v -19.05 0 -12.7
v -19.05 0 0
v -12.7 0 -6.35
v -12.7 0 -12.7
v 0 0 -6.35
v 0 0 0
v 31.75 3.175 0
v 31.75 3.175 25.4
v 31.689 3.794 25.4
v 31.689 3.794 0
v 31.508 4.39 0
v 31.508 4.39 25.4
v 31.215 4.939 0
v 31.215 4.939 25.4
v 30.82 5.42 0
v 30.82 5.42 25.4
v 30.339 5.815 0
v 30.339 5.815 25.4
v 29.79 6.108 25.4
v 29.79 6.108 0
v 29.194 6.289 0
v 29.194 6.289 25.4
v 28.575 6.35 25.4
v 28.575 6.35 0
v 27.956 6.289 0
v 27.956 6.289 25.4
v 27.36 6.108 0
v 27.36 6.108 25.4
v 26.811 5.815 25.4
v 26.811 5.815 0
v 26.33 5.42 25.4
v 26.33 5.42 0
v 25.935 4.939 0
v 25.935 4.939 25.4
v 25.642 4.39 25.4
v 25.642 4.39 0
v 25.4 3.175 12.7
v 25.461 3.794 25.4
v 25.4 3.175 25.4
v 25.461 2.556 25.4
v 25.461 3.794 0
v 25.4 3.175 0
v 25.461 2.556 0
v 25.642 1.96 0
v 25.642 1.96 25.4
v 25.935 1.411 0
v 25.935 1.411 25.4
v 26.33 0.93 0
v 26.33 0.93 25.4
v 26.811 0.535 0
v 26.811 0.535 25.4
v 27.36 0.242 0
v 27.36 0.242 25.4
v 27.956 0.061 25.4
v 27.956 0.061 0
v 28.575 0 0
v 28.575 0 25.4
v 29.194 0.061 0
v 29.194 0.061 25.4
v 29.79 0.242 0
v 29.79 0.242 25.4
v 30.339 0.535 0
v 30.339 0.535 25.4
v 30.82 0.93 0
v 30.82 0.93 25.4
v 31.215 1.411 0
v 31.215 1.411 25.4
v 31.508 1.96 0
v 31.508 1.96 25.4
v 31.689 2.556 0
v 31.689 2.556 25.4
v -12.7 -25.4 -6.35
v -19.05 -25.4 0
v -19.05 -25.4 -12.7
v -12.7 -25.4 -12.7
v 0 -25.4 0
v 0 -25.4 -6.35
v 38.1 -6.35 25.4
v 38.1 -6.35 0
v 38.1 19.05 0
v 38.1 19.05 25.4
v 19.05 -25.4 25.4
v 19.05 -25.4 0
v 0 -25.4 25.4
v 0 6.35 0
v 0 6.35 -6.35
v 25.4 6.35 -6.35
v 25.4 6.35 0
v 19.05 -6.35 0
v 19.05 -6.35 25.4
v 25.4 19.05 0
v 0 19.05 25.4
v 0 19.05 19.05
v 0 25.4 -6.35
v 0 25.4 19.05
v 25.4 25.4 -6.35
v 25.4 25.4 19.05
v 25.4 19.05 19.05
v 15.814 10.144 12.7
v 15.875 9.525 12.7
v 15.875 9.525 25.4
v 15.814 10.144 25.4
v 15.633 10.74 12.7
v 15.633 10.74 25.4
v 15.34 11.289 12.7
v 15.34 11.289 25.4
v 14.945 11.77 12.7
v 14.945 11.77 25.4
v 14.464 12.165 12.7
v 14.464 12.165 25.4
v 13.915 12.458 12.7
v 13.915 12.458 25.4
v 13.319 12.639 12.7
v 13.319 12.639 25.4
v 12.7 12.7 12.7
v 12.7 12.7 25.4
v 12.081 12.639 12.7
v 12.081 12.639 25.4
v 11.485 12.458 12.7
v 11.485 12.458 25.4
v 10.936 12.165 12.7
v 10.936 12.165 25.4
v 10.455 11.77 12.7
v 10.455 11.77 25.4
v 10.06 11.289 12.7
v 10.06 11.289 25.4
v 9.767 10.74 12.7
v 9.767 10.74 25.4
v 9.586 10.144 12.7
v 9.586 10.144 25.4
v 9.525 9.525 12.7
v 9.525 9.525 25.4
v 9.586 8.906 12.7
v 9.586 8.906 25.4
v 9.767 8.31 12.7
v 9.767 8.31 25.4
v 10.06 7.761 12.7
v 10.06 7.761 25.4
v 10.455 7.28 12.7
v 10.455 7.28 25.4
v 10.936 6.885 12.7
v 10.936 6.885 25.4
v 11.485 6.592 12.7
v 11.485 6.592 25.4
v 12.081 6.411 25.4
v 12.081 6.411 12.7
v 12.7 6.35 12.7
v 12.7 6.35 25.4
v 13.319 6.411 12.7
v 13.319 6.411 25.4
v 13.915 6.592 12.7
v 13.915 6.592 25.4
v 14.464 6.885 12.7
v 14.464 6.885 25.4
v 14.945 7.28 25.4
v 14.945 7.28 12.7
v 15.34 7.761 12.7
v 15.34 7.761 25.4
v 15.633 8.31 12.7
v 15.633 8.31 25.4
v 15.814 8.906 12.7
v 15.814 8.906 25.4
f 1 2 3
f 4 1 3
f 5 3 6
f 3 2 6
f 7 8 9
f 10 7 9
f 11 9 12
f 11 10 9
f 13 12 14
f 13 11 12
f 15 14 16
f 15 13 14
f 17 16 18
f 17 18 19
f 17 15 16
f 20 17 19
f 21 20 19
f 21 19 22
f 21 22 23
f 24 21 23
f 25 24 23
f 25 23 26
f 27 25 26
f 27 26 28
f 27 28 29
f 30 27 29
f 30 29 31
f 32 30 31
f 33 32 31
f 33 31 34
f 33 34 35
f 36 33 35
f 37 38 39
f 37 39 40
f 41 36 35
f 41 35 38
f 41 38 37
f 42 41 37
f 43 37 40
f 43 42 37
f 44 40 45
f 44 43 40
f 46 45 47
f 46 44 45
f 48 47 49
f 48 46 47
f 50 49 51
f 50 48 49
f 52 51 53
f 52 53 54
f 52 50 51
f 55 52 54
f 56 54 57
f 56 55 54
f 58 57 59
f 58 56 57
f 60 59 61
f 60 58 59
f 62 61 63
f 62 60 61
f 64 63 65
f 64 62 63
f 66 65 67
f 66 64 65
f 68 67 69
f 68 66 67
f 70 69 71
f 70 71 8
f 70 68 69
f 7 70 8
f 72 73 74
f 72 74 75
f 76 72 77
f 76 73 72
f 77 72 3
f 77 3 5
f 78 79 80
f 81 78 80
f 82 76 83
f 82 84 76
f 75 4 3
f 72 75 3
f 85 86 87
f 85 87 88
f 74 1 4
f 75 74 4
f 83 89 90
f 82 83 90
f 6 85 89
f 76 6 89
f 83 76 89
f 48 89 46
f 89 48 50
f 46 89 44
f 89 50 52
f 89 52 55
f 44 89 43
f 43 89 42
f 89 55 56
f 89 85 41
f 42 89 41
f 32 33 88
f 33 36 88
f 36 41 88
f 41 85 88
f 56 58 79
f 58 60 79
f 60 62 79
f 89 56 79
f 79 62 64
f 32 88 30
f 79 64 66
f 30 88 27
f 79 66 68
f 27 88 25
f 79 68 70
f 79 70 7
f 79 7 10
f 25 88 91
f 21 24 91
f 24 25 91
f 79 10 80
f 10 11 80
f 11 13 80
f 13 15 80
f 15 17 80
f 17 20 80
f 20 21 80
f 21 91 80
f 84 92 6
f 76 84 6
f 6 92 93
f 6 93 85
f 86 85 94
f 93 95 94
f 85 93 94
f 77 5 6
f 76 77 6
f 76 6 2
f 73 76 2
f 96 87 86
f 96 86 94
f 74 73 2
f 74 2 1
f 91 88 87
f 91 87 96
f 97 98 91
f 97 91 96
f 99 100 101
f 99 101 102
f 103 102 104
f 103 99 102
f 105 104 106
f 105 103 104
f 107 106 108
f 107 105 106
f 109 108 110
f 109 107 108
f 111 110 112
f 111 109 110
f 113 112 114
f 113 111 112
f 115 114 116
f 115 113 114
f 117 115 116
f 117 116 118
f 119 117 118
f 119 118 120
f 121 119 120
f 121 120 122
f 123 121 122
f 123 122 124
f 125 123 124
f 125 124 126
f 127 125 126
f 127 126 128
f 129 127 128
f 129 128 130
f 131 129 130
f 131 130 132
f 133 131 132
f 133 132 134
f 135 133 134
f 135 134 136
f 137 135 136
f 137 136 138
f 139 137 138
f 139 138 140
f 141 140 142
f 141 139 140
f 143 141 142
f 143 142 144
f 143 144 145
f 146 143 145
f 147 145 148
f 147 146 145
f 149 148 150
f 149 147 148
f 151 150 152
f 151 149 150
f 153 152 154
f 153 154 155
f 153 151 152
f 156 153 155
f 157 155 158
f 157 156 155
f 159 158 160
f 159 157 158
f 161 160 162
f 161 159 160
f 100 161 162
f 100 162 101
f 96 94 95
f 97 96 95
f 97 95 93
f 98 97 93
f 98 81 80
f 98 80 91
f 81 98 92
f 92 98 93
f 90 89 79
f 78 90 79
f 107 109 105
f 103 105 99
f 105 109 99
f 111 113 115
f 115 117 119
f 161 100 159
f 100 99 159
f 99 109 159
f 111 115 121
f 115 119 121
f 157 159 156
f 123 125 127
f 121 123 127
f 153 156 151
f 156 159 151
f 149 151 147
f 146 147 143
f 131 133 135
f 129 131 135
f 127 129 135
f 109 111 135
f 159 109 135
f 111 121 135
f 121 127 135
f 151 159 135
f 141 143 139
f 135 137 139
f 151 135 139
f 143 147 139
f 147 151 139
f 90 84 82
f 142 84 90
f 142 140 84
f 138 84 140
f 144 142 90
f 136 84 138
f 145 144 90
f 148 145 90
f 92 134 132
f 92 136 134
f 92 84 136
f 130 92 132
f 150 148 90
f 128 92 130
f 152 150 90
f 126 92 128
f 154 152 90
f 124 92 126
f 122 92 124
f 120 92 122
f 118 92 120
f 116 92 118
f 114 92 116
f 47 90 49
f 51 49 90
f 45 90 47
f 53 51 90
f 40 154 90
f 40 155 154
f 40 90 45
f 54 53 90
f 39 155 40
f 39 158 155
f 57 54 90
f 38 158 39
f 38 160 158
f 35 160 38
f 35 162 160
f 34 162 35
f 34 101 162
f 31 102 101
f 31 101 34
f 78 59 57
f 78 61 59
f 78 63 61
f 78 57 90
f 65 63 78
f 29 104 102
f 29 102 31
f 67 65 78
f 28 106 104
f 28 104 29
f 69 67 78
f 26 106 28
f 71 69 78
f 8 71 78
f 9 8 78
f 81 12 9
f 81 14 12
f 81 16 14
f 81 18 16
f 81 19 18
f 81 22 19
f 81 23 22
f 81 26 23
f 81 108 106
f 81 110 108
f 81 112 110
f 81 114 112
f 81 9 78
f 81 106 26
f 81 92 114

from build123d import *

# Parameters (mm, degrees)
F0_R     = 3.175
F0_W     = 19.05
F0_H     = 6.35
F3_DEPTH = 25.4
F1_W     = 19.05
F1_H     = 19.05
F1_H_2   = 6.35
F4_DEPTH = 25.4
F2_W     = 19.05
F2_H     = 6.35
F5_DEPTH = 25.4


with BuildPart() as f3:
    # F0 (on Top) → F3 (new body)
    with BuildSketch(Plane.XY):
        Polygon((0, 19.05), (0, 0), (19.05, 0), (19.05, 12.7), (19.05, 19.05), align=None)
        with Locations((12.7, 9.525)):
            Circle(F0_R, mode=Mode.SUBTRACT)
        Polygon((19.05, 12.7), (19.05, 0), (19.05, -6.35), (38.1, -6.35), (38.1, 12.7), align=None)
        with Locations((28.575, 3.175)):
            Circle(F0_R, mode=Mode.SUBTRACT)
        with Locations((28.575, 15.875)):
            Rectangle(F0_W, F0_H)
    extrude(amount=F3_DEPTH)

    # F1 (on Front) → F4 (join)
    with BuildSketch(Plane.XZ):
        with Locations((9.525, 9.525)):
            Rectangle(F1_W, F1_H)
        Polygon((0, -6.35), (0, 0), (-19.05, 0), (-19.05, -12.7), (-12.7, -12.7), (-12.7, -6.35), align=None)
        with Locations((9.525, 22.225)):
            Rectangle(F1_W, F1_H_2)
    extrude(amount=F4_DEPTH)

    # F2 (on Right) → F5 (join)
    with BuildSketch(Plane.YZ):
        Polygon((0, 12.7), (0, 0), (6.35, 0), (25.4, 0), (25.4, 19.05), (19.05, 19.05), (19.05, 12.7), align=None)
        with Locations((15.875, -3.175)):
            Rectangle(F2_W, F2_H)
    extrude(amount=F5_DEPTH)


solid = f3.part
